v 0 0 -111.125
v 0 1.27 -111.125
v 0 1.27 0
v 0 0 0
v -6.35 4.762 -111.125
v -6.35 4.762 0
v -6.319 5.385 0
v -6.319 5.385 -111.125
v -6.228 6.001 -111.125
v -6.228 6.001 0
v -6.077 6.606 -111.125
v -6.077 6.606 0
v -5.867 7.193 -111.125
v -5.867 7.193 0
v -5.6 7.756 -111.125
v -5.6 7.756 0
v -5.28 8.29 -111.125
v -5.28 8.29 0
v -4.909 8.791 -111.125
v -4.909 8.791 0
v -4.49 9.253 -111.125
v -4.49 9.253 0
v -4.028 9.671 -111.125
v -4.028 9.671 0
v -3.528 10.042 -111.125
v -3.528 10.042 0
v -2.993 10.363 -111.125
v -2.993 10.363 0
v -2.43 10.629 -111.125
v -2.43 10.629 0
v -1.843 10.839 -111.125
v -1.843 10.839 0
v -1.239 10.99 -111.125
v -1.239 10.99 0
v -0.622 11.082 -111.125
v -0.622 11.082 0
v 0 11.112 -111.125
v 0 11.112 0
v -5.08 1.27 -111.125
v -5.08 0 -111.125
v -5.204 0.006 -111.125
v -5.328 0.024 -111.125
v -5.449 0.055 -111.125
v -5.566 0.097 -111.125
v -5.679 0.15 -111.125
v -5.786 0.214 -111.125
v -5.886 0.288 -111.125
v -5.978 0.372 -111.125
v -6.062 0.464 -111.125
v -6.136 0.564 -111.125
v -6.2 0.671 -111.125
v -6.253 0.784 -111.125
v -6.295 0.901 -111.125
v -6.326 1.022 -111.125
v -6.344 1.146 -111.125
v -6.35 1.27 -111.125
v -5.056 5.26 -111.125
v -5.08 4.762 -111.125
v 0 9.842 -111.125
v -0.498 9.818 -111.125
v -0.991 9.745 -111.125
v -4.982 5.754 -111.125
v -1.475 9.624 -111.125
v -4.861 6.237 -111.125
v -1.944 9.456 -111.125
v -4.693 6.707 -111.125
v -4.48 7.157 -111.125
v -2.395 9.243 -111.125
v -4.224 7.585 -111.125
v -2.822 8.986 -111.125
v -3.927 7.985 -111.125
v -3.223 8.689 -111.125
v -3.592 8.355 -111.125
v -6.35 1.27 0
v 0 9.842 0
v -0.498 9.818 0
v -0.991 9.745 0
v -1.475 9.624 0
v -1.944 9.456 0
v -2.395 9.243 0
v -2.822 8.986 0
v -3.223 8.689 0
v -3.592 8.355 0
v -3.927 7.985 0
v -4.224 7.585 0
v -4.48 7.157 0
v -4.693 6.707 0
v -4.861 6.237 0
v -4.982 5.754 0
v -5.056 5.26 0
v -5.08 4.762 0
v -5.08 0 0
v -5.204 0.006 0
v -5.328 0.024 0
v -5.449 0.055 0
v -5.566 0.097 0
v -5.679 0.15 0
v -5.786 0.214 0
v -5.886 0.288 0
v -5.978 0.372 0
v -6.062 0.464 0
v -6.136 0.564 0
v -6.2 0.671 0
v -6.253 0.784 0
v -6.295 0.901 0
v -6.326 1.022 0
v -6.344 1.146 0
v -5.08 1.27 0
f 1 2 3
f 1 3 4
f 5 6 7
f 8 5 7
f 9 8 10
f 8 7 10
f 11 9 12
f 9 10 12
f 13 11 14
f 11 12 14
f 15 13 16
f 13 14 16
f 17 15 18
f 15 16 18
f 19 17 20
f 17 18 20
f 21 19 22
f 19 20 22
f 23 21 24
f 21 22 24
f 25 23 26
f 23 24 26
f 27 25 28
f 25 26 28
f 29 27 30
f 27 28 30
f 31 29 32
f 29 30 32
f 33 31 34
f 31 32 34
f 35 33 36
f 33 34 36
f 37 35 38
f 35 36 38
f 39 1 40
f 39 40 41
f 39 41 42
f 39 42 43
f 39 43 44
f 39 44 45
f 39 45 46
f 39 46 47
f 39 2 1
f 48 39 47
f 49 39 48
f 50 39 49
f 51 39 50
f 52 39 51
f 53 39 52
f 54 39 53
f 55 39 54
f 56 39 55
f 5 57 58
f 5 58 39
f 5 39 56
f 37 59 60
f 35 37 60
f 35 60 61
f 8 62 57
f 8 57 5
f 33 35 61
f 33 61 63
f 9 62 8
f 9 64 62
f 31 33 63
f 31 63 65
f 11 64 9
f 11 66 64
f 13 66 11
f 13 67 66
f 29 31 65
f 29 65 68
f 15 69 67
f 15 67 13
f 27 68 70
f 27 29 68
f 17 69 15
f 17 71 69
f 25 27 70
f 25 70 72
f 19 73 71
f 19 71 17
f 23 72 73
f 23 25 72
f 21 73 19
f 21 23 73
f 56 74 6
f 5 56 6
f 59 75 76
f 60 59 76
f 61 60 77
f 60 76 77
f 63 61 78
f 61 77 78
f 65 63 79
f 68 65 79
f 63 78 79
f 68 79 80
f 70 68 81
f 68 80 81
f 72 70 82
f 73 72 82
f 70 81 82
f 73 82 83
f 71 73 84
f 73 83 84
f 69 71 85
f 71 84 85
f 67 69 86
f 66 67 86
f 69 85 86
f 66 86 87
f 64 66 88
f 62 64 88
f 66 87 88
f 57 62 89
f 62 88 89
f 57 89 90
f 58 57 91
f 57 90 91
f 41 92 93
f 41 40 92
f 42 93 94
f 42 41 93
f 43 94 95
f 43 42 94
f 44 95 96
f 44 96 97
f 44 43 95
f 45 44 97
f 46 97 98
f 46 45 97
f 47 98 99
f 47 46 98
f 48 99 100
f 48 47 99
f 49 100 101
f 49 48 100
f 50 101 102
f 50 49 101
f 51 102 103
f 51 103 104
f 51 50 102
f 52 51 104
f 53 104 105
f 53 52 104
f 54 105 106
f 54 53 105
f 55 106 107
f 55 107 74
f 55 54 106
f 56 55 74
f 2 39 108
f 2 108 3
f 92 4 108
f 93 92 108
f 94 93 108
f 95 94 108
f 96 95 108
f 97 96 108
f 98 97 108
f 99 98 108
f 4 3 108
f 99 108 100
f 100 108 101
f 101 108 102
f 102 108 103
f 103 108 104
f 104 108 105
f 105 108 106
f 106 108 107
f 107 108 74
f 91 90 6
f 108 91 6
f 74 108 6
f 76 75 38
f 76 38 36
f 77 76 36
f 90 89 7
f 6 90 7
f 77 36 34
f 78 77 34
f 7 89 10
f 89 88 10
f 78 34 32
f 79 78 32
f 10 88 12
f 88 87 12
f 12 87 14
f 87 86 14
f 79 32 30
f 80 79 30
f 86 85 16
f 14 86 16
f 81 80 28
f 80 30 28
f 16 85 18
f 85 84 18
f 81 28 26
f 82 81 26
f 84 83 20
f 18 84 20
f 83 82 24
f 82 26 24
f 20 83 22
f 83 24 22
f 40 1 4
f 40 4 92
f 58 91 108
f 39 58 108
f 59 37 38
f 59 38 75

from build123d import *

# Parameters (mm, degrees)
EXTRUDE_THIN1_DEPTH = 111.125
FILLET1_R           = 1.27


with BuildPart() as part:
    # Sketch1 → Extrude-Thin1 (new body)
    with BuildSketch(Plane.XY):
        with BuildLine():
            Line((0, 0), (-6.35, 0))
            Line((-6.35, 0), (-6.35, 4.7625))
            ThreePointArc((-6.35, 4.7625), (-4.490128061, 9.252628061), (0, 11.1125))
            Line((0, 11.1125), (0, 9.8425))
            ThreePointArc((0, 9.8425), (-3.592102448, 8.354602448), (-5.08, 4.7625))
            Line((-5.08, 4.7625), (-5.08, 1.27))
            Line((-5.08, 1.27), (0, 1.27))
            Line((0, 1.27), (0, 0))
        make_face()
    extrude(amount=-EXTRUDE_THIN1_DEPTH)

    # Fillet1
    fillet1_edges = [part.edges().sort_by_distance(p)[0] for p in [
        (-6.35, 0, -55.5625),
    ]]
    fillet(fillet1_edges, radius=FILLET1_R)


solid = part.part
